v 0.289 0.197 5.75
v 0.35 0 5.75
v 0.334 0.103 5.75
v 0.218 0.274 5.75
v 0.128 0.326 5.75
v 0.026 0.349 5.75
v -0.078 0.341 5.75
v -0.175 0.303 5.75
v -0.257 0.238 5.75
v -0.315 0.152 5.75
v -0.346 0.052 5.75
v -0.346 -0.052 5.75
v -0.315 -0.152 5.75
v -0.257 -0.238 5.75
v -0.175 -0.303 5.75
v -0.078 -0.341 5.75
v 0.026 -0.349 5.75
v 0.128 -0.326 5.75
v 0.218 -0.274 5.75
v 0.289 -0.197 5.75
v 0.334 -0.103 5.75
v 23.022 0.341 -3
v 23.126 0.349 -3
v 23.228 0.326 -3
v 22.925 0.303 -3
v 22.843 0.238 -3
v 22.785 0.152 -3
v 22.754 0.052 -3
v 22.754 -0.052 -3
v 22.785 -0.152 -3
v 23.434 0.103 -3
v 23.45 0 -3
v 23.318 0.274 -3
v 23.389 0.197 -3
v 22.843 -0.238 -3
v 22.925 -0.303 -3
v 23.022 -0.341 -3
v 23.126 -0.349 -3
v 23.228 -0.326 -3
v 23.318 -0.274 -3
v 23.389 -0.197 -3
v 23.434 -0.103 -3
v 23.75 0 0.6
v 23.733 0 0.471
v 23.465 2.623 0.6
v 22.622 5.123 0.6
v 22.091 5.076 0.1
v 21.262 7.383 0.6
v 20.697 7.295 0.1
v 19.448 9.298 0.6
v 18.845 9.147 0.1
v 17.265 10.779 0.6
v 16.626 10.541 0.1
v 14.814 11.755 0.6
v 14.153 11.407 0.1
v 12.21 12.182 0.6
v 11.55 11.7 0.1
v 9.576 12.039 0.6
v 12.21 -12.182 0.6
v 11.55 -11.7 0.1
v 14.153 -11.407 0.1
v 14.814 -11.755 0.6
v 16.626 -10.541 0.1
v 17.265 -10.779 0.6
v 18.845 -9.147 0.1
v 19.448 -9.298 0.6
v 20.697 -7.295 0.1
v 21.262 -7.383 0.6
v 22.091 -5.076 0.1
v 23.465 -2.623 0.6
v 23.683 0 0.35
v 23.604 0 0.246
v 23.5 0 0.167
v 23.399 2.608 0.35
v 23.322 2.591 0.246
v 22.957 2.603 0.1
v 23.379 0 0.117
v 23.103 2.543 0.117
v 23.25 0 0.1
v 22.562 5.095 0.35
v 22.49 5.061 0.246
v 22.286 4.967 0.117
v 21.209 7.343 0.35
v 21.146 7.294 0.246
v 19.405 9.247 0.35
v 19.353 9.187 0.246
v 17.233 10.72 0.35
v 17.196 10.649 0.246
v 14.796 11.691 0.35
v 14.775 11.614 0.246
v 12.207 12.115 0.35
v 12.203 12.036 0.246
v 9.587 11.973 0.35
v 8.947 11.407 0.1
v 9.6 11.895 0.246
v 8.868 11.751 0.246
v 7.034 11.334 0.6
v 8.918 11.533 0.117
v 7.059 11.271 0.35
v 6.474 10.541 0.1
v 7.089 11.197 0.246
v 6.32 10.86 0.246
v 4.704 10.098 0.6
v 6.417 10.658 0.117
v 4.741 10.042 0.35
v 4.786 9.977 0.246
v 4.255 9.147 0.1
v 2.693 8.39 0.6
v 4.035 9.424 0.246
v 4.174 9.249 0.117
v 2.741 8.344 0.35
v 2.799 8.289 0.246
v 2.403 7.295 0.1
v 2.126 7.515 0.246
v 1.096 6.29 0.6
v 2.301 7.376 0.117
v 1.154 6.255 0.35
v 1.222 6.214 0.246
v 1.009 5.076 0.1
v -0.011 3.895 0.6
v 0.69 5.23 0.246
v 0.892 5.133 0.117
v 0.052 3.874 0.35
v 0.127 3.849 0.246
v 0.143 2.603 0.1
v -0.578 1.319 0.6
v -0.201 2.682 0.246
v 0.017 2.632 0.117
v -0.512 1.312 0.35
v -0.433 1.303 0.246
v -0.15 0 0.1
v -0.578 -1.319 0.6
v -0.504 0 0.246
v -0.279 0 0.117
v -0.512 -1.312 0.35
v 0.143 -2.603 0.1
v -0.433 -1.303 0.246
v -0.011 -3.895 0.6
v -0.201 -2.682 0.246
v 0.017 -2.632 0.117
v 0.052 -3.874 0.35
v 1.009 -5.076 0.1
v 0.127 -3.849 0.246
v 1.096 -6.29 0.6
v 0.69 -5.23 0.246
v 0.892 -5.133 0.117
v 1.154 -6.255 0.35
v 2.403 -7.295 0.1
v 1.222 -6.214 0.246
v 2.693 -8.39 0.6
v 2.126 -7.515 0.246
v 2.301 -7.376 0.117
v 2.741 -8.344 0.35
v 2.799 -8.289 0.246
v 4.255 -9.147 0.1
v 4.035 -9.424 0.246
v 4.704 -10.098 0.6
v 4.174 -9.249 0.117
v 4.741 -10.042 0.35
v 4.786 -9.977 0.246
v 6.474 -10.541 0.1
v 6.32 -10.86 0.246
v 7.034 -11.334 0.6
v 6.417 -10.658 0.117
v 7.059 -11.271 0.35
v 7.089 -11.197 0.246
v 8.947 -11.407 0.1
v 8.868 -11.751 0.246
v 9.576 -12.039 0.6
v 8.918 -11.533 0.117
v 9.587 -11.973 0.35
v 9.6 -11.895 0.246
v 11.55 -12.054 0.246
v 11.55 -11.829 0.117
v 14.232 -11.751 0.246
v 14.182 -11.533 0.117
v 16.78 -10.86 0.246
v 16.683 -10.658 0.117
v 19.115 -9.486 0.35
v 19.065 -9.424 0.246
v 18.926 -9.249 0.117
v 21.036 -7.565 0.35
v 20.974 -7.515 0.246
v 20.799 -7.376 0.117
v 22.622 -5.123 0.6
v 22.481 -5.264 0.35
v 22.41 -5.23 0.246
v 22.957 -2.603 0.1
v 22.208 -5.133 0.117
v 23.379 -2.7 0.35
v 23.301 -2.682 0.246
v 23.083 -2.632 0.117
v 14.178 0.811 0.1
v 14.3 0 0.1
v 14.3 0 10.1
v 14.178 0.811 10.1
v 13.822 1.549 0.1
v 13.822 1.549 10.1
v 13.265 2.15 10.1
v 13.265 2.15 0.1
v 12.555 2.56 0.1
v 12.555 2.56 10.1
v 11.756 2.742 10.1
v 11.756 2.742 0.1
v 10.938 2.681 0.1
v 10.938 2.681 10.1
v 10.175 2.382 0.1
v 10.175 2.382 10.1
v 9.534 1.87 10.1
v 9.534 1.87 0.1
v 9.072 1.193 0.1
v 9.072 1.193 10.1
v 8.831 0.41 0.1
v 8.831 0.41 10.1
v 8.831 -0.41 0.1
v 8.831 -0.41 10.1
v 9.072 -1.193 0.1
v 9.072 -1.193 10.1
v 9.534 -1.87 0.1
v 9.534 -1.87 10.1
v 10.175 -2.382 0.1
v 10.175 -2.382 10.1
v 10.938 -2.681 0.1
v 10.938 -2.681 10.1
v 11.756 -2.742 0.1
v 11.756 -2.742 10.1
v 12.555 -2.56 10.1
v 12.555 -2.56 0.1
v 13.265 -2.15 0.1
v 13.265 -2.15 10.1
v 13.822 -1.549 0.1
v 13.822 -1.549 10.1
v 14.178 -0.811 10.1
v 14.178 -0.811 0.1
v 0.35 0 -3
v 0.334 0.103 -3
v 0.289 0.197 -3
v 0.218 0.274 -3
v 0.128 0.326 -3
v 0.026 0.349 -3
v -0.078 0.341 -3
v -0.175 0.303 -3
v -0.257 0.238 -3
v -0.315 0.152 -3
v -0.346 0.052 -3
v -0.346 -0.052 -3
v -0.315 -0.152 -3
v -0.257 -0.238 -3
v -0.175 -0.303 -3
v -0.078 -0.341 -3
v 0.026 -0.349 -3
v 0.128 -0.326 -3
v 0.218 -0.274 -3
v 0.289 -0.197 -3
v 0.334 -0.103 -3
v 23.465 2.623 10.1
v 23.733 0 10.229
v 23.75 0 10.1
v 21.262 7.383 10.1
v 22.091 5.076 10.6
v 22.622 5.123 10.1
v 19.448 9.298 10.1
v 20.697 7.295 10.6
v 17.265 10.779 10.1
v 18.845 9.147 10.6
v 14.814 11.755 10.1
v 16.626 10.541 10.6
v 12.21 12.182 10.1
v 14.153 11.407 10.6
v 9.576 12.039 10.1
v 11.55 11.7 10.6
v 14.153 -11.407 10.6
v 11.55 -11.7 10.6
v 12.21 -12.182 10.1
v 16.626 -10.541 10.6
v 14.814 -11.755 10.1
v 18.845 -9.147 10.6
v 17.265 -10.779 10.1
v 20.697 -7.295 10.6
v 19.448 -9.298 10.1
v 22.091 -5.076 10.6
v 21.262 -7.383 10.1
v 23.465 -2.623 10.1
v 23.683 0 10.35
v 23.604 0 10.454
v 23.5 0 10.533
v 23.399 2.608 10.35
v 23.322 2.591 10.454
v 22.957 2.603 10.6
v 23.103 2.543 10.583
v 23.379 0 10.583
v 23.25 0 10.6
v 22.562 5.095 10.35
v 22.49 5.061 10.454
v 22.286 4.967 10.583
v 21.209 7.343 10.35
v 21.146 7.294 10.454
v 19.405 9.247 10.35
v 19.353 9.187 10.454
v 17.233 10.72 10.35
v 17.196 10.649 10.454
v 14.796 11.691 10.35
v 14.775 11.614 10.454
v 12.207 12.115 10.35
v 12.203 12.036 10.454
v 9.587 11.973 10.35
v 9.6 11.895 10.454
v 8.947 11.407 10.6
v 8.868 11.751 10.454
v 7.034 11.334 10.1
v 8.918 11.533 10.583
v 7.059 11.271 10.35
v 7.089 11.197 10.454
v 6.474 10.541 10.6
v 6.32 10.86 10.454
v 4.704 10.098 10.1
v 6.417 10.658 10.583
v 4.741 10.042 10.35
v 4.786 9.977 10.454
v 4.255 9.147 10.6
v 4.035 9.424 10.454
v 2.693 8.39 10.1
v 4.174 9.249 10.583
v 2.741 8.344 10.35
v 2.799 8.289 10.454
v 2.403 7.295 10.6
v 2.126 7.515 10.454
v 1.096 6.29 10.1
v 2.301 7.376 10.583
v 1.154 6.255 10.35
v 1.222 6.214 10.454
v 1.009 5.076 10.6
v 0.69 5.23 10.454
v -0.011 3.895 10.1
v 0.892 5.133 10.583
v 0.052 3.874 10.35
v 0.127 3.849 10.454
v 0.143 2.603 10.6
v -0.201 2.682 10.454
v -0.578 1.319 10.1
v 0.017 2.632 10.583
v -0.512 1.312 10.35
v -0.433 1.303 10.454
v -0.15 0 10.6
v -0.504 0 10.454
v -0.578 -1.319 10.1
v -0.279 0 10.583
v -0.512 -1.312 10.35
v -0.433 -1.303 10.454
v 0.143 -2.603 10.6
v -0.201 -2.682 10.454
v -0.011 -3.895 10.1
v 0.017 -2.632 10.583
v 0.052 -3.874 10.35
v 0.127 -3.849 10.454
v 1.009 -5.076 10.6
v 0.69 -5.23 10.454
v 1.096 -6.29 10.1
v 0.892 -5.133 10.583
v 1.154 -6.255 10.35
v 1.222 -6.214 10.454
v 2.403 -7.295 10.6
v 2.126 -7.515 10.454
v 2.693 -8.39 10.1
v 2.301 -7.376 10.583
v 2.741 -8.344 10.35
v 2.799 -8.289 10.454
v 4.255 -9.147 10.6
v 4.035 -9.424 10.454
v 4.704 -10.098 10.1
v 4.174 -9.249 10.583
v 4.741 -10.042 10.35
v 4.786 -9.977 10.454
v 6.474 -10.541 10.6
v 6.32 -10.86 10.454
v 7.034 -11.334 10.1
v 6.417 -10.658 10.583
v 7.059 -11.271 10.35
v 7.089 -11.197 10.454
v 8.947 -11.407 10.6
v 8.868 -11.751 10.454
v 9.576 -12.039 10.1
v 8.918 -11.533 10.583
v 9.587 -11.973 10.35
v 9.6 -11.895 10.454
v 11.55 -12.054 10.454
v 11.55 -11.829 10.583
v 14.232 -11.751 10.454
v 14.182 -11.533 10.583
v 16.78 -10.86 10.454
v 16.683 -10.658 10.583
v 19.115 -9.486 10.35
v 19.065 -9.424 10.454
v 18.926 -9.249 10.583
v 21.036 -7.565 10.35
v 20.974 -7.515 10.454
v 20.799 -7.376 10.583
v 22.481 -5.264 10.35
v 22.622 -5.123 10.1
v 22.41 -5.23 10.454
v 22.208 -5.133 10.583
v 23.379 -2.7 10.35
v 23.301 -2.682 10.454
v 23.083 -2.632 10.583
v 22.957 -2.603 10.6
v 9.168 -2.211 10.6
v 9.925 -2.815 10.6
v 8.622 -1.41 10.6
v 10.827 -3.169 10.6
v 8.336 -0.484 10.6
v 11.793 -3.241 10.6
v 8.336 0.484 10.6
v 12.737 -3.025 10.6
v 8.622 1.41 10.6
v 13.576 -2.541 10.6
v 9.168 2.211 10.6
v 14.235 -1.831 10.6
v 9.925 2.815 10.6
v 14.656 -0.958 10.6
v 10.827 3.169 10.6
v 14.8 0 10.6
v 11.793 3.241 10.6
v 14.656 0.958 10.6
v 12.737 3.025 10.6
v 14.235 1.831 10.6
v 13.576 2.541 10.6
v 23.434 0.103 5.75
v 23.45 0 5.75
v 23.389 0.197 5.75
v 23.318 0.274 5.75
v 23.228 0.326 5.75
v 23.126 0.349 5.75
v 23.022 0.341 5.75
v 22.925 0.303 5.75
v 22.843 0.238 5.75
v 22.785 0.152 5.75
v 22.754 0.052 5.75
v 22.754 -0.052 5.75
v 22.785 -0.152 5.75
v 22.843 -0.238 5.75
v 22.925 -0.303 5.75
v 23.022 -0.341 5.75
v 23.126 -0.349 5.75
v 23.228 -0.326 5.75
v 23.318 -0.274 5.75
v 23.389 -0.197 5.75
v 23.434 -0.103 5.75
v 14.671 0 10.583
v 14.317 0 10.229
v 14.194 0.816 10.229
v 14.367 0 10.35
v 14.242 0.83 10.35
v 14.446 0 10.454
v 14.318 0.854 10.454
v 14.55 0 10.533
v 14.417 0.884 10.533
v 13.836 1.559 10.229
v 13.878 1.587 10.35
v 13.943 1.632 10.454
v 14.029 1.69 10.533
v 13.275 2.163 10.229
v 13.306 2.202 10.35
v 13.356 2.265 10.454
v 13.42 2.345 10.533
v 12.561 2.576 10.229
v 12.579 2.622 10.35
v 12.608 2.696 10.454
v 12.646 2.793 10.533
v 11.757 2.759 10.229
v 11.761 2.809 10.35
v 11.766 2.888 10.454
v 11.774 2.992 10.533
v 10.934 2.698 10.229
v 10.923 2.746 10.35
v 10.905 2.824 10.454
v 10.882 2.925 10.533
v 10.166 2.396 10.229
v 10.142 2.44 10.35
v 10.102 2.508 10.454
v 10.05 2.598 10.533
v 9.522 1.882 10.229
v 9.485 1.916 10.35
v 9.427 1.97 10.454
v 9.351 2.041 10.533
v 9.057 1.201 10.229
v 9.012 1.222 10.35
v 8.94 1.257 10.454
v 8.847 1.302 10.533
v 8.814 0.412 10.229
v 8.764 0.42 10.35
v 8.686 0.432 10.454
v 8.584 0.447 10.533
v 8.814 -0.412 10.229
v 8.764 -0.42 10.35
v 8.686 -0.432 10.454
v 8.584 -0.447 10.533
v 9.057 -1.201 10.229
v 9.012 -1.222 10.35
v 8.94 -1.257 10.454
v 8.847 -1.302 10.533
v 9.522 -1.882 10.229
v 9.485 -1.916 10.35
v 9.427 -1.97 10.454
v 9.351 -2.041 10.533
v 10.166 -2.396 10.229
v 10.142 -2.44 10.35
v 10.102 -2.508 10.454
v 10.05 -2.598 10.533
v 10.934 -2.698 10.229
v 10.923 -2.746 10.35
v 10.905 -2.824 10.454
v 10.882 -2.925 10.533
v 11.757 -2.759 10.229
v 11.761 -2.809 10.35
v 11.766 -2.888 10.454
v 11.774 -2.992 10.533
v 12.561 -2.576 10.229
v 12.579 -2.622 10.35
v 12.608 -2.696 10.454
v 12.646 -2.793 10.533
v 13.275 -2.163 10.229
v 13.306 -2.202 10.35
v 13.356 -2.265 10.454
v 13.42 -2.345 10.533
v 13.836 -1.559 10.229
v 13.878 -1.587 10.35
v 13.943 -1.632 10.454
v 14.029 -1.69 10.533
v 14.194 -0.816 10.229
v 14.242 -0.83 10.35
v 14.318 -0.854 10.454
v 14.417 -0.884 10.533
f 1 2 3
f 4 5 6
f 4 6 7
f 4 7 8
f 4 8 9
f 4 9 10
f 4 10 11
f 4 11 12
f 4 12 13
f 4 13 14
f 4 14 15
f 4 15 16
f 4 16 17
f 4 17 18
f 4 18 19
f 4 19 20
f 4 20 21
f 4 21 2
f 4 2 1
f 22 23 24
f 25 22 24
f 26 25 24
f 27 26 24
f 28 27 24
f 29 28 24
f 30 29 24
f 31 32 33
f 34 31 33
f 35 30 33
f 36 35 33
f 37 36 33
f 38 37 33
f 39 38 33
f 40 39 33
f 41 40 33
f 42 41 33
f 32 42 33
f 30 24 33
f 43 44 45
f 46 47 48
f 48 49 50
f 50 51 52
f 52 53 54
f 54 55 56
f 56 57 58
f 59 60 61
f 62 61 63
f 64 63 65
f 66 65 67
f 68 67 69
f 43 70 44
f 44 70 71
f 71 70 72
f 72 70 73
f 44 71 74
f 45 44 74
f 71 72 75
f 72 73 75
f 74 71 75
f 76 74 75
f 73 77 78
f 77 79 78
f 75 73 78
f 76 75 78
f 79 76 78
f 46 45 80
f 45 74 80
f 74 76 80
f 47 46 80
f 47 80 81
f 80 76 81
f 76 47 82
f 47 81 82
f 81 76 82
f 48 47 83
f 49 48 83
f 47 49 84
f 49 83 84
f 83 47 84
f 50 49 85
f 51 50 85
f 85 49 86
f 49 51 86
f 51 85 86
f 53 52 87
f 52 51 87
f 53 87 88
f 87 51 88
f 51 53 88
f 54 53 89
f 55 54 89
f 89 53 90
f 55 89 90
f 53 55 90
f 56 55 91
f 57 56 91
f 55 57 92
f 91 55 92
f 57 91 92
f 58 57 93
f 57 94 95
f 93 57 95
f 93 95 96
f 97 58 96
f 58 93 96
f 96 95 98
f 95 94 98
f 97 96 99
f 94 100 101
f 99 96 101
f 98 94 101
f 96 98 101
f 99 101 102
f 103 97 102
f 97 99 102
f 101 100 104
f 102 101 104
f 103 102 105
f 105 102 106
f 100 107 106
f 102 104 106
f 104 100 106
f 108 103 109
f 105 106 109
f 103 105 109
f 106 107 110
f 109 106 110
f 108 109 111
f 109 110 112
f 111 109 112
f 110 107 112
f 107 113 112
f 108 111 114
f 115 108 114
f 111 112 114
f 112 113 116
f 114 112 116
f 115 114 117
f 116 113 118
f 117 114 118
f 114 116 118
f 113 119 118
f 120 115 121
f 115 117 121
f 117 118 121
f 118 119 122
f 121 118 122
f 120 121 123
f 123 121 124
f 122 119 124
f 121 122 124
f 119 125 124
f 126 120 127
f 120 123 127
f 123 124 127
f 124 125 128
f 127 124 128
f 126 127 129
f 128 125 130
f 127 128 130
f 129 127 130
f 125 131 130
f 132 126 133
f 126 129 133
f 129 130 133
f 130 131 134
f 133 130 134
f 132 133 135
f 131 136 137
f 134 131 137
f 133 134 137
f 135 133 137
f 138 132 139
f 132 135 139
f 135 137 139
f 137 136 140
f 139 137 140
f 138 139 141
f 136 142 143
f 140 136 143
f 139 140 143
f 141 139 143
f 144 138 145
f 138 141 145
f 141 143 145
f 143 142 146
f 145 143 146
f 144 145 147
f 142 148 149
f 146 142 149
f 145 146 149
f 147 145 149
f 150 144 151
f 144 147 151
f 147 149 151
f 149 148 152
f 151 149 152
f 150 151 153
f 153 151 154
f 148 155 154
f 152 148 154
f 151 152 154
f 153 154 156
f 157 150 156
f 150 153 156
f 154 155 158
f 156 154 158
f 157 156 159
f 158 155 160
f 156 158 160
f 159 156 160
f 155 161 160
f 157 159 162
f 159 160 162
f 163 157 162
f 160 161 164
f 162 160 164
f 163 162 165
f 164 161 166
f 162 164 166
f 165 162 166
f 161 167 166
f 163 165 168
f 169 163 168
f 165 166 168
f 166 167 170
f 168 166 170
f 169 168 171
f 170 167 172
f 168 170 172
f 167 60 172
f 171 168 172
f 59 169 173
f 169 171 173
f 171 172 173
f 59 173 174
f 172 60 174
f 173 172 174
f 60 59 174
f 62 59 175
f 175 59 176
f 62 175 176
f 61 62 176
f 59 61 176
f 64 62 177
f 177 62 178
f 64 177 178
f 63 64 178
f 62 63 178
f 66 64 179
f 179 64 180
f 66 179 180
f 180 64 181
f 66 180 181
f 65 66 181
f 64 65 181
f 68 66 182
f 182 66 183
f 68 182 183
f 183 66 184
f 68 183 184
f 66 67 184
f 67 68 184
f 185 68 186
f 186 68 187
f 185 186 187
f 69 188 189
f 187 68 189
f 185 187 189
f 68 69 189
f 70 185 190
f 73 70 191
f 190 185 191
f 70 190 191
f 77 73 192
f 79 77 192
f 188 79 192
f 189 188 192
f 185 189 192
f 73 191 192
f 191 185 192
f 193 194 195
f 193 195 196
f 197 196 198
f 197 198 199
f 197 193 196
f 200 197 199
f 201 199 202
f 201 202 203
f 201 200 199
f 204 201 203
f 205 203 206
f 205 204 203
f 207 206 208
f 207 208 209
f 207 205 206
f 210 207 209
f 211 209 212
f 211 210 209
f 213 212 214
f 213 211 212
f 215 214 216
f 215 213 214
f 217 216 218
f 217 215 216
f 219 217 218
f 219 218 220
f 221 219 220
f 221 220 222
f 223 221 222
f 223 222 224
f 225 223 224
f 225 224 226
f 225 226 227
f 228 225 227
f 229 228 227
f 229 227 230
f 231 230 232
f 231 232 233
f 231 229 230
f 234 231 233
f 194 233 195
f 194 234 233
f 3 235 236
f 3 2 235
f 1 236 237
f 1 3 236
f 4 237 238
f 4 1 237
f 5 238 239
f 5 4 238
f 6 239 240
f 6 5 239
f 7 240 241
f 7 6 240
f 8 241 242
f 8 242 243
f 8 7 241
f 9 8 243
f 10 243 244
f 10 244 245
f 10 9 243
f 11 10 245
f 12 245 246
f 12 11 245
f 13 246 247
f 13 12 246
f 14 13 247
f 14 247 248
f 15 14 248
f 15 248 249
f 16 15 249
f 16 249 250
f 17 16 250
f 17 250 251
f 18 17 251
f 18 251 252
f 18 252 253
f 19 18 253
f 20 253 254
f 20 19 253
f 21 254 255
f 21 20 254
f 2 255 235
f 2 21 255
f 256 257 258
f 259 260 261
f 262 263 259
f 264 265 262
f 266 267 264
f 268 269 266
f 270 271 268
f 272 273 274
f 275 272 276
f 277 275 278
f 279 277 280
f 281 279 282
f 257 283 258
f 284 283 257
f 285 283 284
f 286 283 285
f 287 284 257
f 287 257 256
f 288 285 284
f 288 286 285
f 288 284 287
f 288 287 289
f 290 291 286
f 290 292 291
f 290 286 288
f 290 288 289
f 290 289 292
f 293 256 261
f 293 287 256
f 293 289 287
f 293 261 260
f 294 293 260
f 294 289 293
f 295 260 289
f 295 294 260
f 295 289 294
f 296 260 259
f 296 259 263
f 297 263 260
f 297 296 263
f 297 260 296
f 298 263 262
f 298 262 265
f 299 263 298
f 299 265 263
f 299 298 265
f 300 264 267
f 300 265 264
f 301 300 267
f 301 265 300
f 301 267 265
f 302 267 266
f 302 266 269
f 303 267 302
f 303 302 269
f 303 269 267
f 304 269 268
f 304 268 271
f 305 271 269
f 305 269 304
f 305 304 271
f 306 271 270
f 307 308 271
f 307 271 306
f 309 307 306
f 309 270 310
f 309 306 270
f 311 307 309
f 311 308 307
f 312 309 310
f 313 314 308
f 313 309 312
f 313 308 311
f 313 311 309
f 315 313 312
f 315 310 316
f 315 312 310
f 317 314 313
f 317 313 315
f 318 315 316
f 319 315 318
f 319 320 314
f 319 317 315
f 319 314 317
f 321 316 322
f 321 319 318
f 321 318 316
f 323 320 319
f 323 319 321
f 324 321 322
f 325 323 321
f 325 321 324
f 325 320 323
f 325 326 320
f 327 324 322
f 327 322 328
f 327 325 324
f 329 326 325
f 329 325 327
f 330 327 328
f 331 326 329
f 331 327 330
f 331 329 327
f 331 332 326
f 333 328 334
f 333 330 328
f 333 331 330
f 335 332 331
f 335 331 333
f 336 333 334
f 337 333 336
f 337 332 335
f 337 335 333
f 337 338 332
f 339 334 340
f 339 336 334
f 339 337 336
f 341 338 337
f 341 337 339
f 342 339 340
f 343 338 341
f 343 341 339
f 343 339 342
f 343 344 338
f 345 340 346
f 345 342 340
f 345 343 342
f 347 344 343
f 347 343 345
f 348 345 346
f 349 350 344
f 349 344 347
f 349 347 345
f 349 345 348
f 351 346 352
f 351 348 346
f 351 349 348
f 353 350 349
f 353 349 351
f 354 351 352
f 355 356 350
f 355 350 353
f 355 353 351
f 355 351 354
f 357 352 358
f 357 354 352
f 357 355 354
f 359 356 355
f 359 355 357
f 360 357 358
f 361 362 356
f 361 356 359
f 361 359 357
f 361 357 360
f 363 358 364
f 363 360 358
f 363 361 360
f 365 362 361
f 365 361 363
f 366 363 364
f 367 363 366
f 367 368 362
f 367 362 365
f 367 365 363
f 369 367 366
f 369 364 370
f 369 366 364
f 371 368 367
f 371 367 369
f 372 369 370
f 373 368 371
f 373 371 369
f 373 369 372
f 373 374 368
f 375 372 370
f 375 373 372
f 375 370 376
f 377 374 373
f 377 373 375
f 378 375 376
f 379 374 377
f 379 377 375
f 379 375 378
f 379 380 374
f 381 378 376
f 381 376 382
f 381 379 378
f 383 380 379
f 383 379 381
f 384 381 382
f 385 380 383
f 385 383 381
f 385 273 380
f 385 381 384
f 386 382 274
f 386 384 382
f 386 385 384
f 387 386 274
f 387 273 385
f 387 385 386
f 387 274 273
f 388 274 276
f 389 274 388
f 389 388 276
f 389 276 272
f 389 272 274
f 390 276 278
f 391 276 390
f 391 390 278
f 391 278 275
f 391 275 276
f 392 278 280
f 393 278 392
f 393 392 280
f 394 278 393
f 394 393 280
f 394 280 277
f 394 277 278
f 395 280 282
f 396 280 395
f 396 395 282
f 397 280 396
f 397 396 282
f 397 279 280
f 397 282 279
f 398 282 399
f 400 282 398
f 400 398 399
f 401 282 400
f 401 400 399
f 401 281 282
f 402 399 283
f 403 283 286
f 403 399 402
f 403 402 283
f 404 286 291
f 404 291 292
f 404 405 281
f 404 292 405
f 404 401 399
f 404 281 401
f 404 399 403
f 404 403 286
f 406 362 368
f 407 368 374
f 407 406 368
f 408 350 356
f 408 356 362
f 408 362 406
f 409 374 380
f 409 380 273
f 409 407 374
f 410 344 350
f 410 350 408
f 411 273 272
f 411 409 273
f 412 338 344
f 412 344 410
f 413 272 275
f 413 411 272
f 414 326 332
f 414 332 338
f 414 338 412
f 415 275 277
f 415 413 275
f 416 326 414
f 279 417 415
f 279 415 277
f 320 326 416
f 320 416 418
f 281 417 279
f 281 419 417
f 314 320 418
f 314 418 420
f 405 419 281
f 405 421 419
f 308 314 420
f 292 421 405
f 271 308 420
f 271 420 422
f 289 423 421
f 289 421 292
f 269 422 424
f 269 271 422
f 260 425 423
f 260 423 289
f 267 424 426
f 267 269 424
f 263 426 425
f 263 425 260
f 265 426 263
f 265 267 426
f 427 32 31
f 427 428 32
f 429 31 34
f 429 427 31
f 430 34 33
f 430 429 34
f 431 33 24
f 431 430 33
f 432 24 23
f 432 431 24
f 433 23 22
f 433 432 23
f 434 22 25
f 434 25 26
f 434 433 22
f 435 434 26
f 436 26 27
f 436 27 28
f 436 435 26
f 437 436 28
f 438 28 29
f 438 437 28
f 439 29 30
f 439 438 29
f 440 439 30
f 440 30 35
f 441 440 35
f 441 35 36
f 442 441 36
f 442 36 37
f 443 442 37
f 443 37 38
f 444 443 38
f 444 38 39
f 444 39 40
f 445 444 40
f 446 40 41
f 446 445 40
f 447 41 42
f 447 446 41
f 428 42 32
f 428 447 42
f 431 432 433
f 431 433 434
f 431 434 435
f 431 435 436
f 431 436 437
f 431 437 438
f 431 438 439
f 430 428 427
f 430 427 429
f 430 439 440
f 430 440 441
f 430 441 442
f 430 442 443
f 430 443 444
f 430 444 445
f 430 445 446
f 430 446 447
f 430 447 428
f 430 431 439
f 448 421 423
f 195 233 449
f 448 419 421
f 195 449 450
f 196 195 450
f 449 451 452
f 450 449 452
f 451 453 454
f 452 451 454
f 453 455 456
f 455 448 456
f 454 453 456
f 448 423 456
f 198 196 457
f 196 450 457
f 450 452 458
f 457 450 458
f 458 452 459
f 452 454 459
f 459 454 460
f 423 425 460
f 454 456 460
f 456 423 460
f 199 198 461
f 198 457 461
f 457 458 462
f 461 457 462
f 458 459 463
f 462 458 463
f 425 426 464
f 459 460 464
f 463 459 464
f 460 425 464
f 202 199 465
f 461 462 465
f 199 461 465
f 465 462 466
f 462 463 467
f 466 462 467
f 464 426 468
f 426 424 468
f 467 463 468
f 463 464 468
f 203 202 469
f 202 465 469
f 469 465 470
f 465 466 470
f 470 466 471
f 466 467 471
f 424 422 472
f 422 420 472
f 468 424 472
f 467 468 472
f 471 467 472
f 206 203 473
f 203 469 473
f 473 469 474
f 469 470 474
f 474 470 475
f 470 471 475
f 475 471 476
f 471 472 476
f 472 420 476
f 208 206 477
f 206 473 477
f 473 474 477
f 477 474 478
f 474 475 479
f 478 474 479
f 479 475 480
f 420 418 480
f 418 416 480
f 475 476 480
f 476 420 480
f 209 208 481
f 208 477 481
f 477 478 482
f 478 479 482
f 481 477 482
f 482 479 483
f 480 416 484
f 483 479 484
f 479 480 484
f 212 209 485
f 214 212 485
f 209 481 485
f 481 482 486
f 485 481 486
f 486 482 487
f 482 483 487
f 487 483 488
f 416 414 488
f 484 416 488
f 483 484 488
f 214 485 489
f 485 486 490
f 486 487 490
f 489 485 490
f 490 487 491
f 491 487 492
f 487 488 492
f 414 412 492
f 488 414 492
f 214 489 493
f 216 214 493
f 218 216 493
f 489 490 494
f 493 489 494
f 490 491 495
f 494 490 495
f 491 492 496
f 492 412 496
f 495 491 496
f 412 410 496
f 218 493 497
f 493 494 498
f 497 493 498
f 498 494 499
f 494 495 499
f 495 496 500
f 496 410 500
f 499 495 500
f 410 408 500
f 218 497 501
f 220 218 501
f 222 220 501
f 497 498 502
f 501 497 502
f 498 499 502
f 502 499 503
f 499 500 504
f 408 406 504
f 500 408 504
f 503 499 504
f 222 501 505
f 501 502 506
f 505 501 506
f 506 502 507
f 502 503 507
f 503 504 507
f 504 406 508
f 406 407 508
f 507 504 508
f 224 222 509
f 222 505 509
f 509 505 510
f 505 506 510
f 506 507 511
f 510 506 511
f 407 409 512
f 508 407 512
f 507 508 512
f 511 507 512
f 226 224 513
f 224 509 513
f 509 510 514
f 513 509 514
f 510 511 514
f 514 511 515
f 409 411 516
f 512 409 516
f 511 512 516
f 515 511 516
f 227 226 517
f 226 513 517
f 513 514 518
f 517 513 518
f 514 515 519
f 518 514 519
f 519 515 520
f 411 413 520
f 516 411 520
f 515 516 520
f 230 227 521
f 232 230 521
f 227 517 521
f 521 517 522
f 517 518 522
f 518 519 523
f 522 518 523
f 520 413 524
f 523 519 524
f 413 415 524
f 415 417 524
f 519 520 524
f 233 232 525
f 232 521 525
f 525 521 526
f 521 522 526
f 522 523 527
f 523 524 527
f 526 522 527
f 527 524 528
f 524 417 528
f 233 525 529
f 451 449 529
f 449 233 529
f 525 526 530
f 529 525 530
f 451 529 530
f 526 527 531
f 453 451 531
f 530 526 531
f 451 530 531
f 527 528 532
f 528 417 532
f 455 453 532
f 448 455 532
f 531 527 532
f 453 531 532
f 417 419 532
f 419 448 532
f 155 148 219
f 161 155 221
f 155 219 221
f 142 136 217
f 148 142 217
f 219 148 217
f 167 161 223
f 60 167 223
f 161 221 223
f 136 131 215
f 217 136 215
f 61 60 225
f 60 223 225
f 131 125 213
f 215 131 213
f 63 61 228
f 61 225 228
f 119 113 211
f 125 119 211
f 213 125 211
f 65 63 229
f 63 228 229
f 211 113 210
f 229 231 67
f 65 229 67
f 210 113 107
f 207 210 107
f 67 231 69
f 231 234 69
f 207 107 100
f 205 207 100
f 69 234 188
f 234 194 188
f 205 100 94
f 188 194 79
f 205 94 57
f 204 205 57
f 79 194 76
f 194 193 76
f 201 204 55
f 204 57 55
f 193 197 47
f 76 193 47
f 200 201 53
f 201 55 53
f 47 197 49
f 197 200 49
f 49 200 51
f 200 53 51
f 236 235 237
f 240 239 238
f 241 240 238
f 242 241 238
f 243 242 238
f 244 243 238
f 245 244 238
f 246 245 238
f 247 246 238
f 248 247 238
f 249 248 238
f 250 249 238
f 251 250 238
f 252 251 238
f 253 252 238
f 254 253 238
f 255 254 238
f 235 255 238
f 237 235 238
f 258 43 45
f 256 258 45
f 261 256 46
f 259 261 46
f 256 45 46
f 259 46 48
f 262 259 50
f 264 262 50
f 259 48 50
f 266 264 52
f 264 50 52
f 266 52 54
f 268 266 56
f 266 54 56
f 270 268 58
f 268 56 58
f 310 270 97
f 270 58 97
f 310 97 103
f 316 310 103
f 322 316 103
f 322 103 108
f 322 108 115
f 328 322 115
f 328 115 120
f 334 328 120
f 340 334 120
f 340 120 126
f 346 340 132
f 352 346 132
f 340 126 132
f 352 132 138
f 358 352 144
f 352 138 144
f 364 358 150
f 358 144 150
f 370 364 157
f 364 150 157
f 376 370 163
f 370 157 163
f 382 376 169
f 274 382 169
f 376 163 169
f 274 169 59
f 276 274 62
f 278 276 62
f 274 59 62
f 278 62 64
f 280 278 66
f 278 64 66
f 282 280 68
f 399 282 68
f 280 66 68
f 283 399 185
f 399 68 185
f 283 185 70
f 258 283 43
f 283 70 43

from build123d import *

# Parameters (mm, degrees)
SKETCH001_R       = 0.35
PAD001_DEPTH      = 5.25
PAD001_DEPTH_BACK = 3.5
SKETCH_R          = 12.2
SKETCH_R_2        = 2.75
PAD_DEPTH         = 10.5
FILLET_R          = 0.5


with BuildPart() as pad001:
    # Sketch001 → Pad001 (new body, two sides)
    with BuildSketch(Plane.XY.offset(0.5)) as pad001_sk:
        Circle(SKETCH001_R)
        with Locations((23.1, 0)):
            Circle(SKETCH001_R)
    extrude(amount=PAD001_DEPTH)
    extrude(pad001_sk.sketch, amount=-PAD001_DEPTH_BACK)


with BuildPart() as fillet_body:
    # Sketch → Pad (new body)
    with BuildSketch(Plane.XY.offset(0.1)):
        with Locations((11.55, 0)):
            Circle(SKETCH_R)
        with Locations((11.55, 0)):
            Circle(SKETCH_R_2, mode=Mode.SUBTRACT)
    extrude(amount=PAD_DEPTH)

    # Fillet
    fillet_edges = [fillet_body.edges().sort_by_distance(p)[0] for p in [
        (8.8, 0, 10.6),
        (-0.65, 0, 10.6),
        (-0.65, 0, 0.1),
    ]]
    fillet(fillet_edges, radius=FILLET_R)


solid = Compound([pad001.part, fillet_body.part])
